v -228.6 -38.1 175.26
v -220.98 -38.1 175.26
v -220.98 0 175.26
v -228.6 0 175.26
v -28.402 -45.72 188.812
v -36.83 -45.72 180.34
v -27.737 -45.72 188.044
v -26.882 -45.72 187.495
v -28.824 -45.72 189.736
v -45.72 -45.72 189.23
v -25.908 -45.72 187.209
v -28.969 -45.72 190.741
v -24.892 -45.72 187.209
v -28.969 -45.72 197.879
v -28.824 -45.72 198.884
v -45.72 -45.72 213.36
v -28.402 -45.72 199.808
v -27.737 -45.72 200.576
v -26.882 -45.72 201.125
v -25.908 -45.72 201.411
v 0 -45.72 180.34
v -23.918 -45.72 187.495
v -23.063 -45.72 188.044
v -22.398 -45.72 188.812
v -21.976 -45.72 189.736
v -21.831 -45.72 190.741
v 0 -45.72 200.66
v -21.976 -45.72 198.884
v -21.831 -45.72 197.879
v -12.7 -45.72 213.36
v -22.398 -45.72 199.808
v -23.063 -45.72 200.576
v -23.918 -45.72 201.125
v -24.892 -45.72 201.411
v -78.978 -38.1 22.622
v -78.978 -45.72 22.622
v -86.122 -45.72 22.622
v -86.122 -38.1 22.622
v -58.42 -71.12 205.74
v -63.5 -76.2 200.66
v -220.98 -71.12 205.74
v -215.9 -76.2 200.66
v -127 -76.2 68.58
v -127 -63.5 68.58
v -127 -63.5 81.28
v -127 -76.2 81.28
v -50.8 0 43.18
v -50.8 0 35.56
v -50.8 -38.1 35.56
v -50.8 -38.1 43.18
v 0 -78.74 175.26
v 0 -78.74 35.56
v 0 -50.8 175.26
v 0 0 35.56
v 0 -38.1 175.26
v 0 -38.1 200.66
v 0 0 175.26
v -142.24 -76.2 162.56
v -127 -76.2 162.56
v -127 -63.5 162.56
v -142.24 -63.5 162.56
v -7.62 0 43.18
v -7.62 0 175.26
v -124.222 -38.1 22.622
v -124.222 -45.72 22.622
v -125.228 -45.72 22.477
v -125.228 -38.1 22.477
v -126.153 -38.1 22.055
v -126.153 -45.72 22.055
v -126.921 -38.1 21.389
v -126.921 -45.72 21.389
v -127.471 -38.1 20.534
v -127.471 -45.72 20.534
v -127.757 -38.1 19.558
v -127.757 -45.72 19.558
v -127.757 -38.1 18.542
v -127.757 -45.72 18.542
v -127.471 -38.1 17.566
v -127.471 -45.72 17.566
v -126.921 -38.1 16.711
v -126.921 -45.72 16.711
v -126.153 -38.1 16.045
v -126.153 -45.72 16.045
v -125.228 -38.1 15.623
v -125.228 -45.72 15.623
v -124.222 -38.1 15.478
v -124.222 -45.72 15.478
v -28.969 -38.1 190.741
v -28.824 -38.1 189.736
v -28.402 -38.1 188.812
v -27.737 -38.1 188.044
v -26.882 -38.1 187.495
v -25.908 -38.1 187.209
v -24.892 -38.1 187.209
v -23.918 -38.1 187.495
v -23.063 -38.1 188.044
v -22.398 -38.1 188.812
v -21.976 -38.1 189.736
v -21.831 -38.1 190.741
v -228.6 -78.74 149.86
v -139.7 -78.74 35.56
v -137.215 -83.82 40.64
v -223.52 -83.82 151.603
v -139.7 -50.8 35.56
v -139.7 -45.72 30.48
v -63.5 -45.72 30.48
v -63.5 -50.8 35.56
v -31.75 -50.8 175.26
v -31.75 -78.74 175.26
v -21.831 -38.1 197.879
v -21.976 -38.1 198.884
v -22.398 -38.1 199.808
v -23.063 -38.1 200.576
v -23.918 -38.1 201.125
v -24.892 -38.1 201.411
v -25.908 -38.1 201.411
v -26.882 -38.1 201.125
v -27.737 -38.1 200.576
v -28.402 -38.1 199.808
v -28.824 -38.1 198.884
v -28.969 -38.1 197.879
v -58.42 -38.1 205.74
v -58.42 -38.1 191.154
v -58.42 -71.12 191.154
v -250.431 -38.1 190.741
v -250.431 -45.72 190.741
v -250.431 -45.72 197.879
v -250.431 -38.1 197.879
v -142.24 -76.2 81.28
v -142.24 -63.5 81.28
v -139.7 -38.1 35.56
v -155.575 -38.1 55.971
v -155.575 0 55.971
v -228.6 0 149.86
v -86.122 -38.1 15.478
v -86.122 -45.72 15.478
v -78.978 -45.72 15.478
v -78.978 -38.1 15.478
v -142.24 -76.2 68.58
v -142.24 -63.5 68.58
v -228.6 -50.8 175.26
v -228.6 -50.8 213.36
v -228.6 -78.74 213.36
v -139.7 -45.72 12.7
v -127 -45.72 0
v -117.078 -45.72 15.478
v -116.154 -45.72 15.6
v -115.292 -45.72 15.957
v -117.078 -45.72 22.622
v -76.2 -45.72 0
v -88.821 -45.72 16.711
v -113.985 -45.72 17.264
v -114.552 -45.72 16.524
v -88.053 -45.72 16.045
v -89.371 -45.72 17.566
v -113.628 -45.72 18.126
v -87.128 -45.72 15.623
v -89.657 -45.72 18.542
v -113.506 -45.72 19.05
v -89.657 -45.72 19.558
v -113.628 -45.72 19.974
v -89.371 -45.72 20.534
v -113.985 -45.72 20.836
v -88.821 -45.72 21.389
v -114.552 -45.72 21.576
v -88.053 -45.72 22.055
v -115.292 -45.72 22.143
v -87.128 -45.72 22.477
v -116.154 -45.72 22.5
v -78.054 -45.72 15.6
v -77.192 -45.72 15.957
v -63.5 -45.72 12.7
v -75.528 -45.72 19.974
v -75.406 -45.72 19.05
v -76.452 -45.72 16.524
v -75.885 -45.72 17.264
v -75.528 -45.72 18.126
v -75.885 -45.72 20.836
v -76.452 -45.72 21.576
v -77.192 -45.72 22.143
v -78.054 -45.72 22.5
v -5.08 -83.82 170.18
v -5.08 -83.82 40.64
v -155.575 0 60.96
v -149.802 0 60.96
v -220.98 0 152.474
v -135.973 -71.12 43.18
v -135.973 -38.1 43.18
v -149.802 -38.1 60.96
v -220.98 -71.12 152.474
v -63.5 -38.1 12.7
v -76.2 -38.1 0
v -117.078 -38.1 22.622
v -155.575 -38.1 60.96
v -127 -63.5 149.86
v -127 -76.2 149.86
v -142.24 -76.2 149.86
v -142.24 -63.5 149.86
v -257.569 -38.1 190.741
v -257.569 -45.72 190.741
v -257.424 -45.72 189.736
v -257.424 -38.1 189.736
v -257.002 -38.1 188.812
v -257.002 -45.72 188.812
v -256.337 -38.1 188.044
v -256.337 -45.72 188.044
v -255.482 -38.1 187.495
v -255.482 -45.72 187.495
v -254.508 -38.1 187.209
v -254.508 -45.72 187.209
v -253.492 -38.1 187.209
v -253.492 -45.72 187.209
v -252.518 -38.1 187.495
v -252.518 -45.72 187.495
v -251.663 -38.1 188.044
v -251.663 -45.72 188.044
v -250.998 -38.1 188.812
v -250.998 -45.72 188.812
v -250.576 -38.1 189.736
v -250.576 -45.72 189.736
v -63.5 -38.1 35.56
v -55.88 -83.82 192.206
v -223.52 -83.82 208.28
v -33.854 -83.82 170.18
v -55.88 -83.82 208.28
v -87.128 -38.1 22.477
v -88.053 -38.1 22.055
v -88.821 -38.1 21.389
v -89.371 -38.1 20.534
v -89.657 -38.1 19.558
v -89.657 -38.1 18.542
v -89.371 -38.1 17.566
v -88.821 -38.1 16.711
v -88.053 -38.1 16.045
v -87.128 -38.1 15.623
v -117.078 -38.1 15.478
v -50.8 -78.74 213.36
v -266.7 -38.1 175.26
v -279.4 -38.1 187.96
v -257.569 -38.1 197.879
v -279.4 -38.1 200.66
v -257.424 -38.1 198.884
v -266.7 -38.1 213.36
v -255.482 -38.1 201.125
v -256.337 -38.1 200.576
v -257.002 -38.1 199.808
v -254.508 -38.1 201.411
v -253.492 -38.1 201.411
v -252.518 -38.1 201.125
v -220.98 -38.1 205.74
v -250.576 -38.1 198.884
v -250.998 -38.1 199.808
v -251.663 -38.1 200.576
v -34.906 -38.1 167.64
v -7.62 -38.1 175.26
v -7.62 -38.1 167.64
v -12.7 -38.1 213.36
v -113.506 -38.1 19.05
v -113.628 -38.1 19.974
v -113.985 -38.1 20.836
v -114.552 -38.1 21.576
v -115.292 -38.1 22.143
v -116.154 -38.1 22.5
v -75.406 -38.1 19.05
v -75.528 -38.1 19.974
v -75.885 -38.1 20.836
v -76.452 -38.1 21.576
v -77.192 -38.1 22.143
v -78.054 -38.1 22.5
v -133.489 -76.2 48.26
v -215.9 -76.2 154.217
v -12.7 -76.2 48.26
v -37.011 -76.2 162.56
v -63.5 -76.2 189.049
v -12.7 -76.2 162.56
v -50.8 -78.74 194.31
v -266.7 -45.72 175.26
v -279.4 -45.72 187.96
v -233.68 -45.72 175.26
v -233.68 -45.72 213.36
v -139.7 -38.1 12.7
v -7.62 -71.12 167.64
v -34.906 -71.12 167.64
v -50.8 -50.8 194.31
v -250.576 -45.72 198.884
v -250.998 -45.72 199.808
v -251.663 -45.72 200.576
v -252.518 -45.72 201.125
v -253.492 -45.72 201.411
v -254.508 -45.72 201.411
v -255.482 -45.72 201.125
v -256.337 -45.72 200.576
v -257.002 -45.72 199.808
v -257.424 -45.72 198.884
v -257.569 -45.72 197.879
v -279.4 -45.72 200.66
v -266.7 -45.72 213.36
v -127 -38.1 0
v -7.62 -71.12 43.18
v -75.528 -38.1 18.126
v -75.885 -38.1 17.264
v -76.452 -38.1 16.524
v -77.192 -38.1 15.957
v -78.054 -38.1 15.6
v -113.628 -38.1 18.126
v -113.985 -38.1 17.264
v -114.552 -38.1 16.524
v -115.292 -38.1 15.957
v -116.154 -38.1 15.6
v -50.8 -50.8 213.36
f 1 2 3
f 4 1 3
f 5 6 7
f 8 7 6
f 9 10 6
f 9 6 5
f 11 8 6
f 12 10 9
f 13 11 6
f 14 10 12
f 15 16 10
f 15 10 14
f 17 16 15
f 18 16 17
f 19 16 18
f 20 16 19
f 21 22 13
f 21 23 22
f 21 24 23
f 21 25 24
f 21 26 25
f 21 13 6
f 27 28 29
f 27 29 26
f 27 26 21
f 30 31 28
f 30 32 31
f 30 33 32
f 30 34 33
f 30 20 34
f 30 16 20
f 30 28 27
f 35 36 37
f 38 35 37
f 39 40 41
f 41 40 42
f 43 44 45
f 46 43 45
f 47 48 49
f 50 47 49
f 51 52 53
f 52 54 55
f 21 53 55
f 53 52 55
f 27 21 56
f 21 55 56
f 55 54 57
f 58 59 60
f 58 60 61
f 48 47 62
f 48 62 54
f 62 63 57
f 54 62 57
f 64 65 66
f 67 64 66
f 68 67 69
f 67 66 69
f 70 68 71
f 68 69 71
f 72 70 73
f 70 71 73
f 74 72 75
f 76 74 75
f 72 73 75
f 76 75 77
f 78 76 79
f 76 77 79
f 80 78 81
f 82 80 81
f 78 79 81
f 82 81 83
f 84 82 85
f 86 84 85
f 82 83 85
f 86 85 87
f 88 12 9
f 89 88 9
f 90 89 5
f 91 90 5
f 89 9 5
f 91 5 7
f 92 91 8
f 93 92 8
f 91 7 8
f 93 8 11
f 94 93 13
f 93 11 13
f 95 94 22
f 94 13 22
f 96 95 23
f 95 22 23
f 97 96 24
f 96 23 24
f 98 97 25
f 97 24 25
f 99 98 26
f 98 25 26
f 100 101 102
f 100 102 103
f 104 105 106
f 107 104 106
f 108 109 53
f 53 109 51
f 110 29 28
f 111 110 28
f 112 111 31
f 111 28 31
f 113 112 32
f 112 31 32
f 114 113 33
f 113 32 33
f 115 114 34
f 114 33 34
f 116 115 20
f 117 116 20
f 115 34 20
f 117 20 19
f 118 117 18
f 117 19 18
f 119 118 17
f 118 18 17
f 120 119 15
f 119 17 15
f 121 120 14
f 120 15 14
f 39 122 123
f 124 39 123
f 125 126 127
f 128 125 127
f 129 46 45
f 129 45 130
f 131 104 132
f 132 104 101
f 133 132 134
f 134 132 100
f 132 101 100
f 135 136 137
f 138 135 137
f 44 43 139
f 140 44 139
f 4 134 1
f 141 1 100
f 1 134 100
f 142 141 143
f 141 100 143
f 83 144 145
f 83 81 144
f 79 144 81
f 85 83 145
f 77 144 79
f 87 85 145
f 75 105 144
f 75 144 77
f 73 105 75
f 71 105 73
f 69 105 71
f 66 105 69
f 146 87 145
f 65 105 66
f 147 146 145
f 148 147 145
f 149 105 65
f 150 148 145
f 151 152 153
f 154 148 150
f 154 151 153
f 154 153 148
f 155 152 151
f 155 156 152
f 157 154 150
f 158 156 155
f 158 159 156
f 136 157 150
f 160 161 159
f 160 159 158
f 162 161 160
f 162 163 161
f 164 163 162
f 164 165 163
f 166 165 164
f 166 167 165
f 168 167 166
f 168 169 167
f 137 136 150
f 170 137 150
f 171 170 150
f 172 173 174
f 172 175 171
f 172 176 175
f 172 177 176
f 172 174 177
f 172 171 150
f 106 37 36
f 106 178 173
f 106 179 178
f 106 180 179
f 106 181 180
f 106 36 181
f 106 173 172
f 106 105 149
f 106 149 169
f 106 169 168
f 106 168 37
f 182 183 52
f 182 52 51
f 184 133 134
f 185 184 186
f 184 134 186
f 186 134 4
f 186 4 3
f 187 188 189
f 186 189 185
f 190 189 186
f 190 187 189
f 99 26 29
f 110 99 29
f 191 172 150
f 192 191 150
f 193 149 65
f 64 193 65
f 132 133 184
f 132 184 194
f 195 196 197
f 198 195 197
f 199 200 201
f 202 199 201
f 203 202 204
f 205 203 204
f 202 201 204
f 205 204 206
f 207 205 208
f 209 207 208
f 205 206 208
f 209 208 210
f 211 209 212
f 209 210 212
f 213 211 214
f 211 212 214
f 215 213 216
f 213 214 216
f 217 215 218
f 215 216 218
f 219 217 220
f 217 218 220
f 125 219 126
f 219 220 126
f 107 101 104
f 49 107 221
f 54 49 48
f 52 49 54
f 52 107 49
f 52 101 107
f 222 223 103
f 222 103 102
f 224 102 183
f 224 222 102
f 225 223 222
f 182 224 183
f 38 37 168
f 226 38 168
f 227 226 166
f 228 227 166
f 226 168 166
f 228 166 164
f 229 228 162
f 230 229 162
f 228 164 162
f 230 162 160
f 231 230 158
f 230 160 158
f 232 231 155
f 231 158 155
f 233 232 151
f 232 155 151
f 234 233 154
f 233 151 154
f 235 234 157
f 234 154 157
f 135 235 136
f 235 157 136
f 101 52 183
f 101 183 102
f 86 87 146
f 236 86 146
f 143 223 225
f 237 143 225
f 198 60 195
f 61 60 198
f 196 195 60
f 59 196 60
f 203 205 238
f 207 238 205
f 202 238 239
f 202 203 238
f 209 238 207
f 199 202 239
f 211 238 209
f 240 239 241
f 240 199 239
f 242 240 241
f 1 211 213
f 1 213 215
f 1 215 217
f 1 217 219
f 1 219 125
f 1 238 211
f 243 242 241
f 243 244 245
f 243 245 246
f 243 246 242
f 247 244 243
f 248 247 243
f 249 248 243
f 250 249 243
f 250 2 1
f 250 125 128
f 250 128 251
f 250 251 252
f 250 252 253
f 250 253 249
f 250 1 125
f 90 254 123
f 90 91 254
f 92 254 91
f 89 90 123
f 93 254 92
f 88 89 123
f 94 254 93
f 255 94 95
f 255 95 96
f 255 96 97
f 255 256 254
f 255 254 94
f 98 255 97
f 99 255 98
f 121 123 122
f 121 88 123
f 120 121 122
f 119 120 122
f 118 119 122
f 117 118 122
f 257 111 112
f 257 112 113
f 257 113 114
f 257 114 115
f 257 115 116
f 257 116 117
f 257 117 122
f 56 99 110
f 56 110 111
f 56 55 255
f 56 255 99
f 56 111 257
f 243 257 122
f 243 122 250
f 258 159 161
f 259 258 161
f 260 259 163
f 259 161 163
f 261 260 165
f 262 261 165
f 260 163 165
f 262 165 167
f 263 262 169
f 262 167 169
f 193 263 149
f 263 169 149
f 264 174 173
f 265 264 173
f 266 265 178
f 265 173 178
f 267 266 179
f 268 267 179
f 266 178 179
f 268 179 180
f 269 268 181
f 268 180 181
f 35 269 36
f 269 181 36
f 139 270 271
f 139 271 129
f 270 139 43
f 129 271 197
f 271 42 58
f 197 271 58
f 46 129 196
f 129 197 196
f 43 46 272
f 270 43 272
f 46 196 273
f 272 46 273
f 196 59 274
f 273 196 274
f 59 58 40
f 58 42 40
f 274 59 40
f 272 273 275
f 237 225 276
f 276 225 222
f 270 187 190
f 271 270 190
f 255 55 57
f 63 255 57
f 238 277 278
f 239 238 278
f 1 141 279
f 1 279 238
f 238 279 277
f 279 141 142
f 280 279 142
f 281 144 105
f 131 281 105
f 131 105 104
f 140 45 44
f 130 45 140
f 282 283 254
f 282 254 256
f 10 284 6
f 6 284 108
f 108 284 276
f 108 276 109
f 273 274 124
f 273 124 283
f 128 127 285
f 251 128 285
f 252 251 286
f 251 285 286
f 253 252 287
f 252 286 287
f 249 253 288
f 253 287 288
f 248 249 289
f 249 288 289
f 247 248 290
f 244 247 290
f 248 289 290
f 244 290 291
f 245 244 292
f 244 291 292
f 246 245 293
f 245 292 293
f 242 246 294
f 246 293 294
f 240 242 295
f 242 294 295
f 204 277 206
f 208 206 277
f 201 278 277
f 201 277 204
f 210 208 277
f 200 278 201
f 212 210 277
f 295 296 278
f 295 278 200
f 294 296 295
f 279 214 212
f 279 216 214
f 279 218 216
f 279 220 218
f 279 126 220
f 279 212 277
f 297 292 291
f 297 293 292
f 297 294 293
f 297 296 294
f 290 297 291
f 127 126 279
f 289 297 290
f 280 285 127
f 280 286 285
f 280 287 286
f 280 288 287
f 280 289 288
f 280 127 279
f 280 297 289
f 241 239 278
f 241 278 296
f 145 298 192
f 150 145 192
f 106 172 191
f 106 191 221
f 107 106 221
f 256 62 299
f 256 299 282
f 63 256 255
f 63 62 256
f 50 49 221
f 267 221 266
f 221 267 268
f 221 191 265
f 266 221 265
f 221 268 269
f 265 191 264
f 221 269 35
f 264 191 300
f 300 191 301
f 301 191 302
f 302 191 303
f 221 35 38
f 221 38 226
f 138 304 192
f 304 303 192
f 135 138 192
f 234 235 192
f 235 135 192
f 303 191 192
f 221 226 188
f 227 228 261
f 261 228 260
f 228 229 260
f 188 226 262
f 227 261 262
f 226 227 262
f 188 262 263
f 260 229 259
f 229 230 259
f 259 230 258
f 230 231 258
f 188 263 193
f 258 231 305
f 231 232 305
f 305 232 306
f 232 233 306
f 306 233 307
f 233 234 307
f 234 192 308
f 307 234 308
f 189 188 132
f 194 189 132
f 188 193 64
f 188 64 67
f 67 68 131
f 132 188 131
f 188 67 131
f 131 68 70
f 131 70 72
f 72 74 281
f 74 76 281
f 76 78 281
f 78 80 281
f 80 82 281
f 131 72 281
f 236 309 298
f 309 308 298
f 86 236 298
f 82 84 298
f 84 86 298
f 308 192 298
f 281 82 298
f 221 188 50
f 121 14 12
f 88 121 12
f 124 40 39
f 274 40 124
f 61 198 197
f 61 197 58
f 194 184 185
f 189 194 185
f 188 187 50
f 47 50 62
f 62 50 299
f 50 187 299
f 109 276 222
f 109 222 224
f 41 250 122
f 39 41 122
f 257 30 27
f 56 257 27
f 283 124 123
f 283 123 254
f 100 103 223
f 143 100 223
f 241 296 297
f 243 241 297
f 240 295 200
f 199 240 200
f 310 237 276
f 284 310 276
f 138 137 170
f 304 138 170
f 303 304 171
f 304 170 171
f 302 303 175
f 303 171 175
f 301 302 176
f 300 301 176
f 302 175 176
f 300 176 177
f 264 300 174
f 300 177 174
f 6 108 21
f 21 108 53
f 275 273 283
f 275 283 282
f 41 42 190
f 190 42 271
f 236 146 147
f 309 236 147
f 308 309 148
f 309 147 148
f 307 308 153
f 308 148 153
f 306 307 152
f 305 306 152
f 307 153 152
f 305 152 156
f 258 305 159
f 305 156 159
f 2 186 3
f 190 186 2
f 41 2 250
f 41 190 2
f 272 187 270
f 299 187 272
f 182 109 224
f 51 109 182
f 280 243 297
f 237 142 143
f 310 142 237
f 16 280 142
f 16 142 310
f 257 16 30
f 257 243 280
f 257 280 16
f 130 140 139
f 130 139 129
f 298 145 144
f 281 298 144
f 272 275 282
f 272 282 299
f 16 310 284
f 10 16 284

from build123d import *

# Parameters (mm, degrees)
F0_W      = 279.4
F0_H      = 213.36
F1_DEPTH  = 83.82
F2_W      = 76.2
F2_H      = 35.56
F2_W_2    = 50.8
F2_H_2    = 38.1
F3_DEPTH  = 38.1
F2_W_3    = 63.5
F4_DEPTH  = 83.82
F5_T      = -7.62
F6_W      = 38.1
F6_H      = 38.1
F6_H_2    = 35.56
F7_DEPTH  = 341.884
F9_DEPTH  = 7.62
F10_SIZE  = 5.08
F11_W     = 84.455
F11_H     = 38.1
F12_DEPTH = 25.4
F13_W     = 15.24
F13_H     = 12.7
F14_DEPTH = 12.7


# Not quite as in the source:
# - a feature names something its author has since deleted; it is built from what else it names


with BuildPart() as f1:
    # F0 (on Front) → F1 (new body)
    with BuildSketch(Plane.XZ):
        with Locations((-139.7, 106.68)):
            Rectangle(F0_W, F0_H)
    extrude(amount=F1_DEPTH)

    # F2 (on face) → F3 (cut)
    with BuildSketch(Plane.XZ.offset(83.82)):
        Polygon((0, 213.36), (-50.8, 213.36), (-50.8, 194.31), (-31.75, 175.26), (0, 175.26), align=None)
        with Locations((-101.6, 17.78)):
            Rectangle(F2_W, F2_H)
        with Locations((-254, 194.31)):
            Rectangle(F2_W_2, F2_H_2)
    extrude(amount=-F3_DEPTH, mode=Mode.SUBTRACT)

    # F2 (on face) → F4 (cut)
    with BuildSketch(Plane.XZ.offset(83.82)):
        Polygon((-228.6, 149.86), (-228.6, 175.26), (-279.4, 175.26), (-279.4, 0), (-139.7, 0), (-139.7, 35.56), align=None)
        with Locations((-31.75, 17.78)):
            Rectangle(F2_W_3, F2_H)
    extrude(amount=-F4_DEPTH, mode=Mode.SUBTRACT)

    # F5
    f5_openings = [f1.faces().sort_by_distance(p)[0] for p in [
        (-109.470638, 0, 127.051961),
    ]]
    offset(amount=F5_T, openings=f5_openings, kind=Kind.INTERSECTION)

    # F6 (on face) → F7 (cut)
    with BuildSketch(Plane.YZ):
        with Locations((-19.05, 194.31)):
            Rectangle(F6_W, F6_H)
        with Locations((-19.05, 17.78)):
            Rectangle(F6_W, F6_H_2)
    extrude(amount=-F7_DEPTH, mode=Mode.SUBTRACT)

    # F8 (on face) → F9 (cut)
    with BuildSketch(Plane.XZ.offset(45.72)):
        with BuildLine():
            ThreePointArc((-22.3094151415, 192.52565), (-21.9529005037, 193.3863524737), (-21.8313, 194.31))
            ThreePointArc((-21.8313, 194.31), (-21.9529005037, 195.2336475263), (-22.3094151415, 196.09435))
            ThreePointArc((-22.3094151415, 196.09435), (-23.61565, 194.7881151415), (-25.4, 194.31))
            ThreePointArc((-25.4, 194.31), (-23.61565, 193.8318848585), (-22.3094151415, 192.52565))
        make_face()
        with BuildLine():
            ThreePointArc((-25.4, 194.31), (-27.18435, 194.7881151415), (-28.4905848585, 196.09435))
            ThreePointArc((-28.4905848585, 196.09435), (-28.8470994963, 195.2336475263), (-28.9687, 194.31))
            ThreePointArc((-28.9687, 194.31), (-28.8470994963, 193.3863524737), (-28.4905848585, 192.52565))
            ThreePointArc((-28.4905848585, 192.52565), (-27.18435, 193.8318848585), (-25.4, 194.31))
        make_face()
        Polygon((0, 200.66), (0, 213.36), (-12.7, 213.36), align=None)
        with BuildLine():
            ThreePointArc((-250.9094151415, 192.52565), (-250.5529005037, 193.3863524737), (-250.4313, 194.31))
            ThreePointArc((-250.4313, 194.31), (-250.5529005037, 195.2336475263), (-250.9094151415, 196.09435))
            ThreePointArc((-250.9094151415, 196.09435), (-252.21565, 194.7881151415), (-254, 194.31))
            ThreePointArc((-254, 194.31), (-252.21565, 193.8318848585), (-250.9094151415, 192.52565))
        make_face()
        with BuildLine():
            ThreePointArc((-254, 194.31), (-255.78435, 194.7881151415), (-257.0905848585, 196.09435))
            ThreePointArc((-257.0905848585, 196.09435), (-257.4470994963, 195.2336475263), (-257.5687, 194.31))
            ThreePointArc((-257.5687, 194.31), (-257.4470994963, 193.3863524737), (-257.0905848585, 192.52565))
            ThreePointArc((-257.0905848585, 192.52565), (-255.78435, 193.8318848585), (-254, 194.31))
        make_face()
        Polygon((-279.4, 200.66), (-266.7, 213.36), (-279.4, 213.36), align=None)
        Polygon((-279.4, 175.26), (-266.7, 175.26), (-279.4, 187.96), align=None)
        Polygon((-127, 0), (-139.7, 12.7), (-139.7, 0), align=None)
        Polygon((-63.5, 12.7), (-76.2, 0), (-63.5, 0), align=None)
        with BuildLine():
            ThreePointArc((-82.55, 19.05), (-82.0714594891, 20.8359375), (-80.7640625, 22.1433344891))
            ThreePointArc((-80.7640625, 22.1433344891), (-81.6255307233, 22.5001663108), (-82.55, 22.621875))
            ThreePointArc((-82.55, 22.621875), (-83.4744692767, 22.5001663108), (-84.3359375, 22.1433344891))
            ThreePointArc((-84.3359375, 22.1433344891), (-83.0285405109, 20.8359375), (-82.55, 19.05))
        make_face()
        with BuildLine():
            ThreePointArc((-82.55, 15.478125), (-81.6255307233, 15.5998336892), (-80.7640625, 15.9566655109))
            ThreePointArc((-80.7640625, 15.9566655109), (-82.0714594891, 17.2640625), (-82.55, 19.05))
            ThreePointArc((-82.55, 19.05), (-83.0285405109, 17.2640625), (-84.3359375, 15.9566655109))
            ThreePointArc((-84.3359375, 15.9566655109), (-83.4744692767, 15.5998336892), (-82.55, 15.478125))
        make_face()
        with BuildLine():
            ThreePointArc((-120.65, 19.05), (-120.1714594891, 20.8359375), (-118.8640625, 22.1433344891))
            ThreePointArc((-118.8640625, 22.1433344891), (-119.7255307233, 22.5001663108), (-120.65, 22.621875))
            ThreePointArc((-120.65, 22.621875), (-121.5744692767, 22.5001663108), (-122.4359375, 22.1433344891))
            ThreePointArc((-122.4359375, 22.1433344891), (-121.1285405109, 20.8359375), (-120.65, 19.05))
        make_face()
        with BuildLine():
            ThreePointArc((-120.65, 15.478125), (-119.7255307233, 15.5998336892), (-118.8640625, 15.9566655109))
            ThreePointArc((-118.8640625, 15.9566655109), (-120.1714594891, 17.2640625), (-120.65, 19.05))
            ThreePointArc((-120.65, 19.05), (-121.1285405109, 17.2640625), (-122.4359375, 15.9566655109))
            ThreePointArc((-122.4359375, 15.9566655109), (-121.5744692767, 15.5998336892), (-120.65, 15.478125))
        make_face()
        with BuildLine():
            ThreePointArc((-28.4905848585, 196.09435), (-25.4, 197.8787), (-22.3094151415, 196.09435))
            ThreePointArc((-22.3094151415, 196.09435), (-21.9529005037, 196.9550524737), (-21.8313, 197.8787))
            ThreePointArc((-21.8313, 197.8787), (-25.4, 201.4474), (-28.9687, 197.8787))
            ThreePointArc((-28.9687, 197.8787), (-28.8470994963, 196.9550524737), (-28.4905848585, 196.09435))
        make_face()
        with BuildLine():
            ThreePointArc((-25.4, 194.31), (-23.61565, 194.7881151415), (-22.3094151415, 196.09435))
            ThreePointArc((-22.3094151415, 196.09435), (-25.4, 197.8787), (-28.4905848585, 196.09435))
            ThreePointArc((-28.4905848585, 196.09435), (-27.18435, 194.7881151415), (-25.4, 194.31))
        make_face()
        with BuildLine():
            ThreePointArc((-28.4905848585, 192.52565), (-25.4, 190.7413), (-22.3094151415, 192.52565))
            ThreePointArc((-22.3094151415, 192.52565), (-23.61565, 193.8318848585), (-25.4, 194.31))
            ThreePointArc((-25.4, 194.31), (-27.18435, 193.8318848585), (-28.4905848585, 192.52565))
        make_face()
        with BuildLine():
            ThreePointArc((-21.8313, 190.7413), (-21.9529005037, 191.6649475263), (-22.3094151415, 192.52565))
            ThreePointArc((-22.3094151415, 192.52565), (-25.4, 190.7413), (-28.4905848585, 192.52565))
            ThreePointArc((-28.4905848585, 192.52565), (-28.8470994963, 191.6649475263), (-28.9687, 190.7413))
            ThreePointArc((-28.9687, 190.7413), (-25.4, 187.1726), (-21.8313, 190.7413))
        make_face()
        with BuildLine():
            ThreePointArc((-28.9687, 194.31), (-28.8470994963, 195.2336475263), (-28.4905848585, 196.09435))
            ThreePointArc((-28.4905848585, 196.09435), (-28.8470994963, 196.9550524737), (-28.9687, 197.8787))
            Line((-28.9687, 197.8787), (-28.9687, 194.31))
        make_face()
        with BuildLine():
            ThreePointArc((-22.3094151415, 196.09435), (-21.9529005037, 195.2336475263), (-21.8313, 194.31))
            Line((-21.8313, 194.31), (-21.8313, 197.8787))
            ThreePointArc((-21.8313, 197.8787), (-21.9529005037, 196.9550524737), (-22.3094151415, 196.09435))
        make_face()
        with BuildLine():
            Line((-21.8313, 190.7413), (-21.8313, 194.31))
            ThreePointArc((-21.8313, 194.31), (-21.9529005037, 193.3863524737), (-22.3094151415, 192.52565))
            ThreePointArc((-22.3094151415, 192.52565), (-21.9529005037, 191.6649475263), (-21.8313, 190.7413))
        make_face()
        with BuildLine():
            ThreePointArc((-28.9687, 190.7413), (-28.8470994963, 191.6649475263), (-28.4905848585, 192.52565))
            ThreePointArc((-28.4905848585, 192.52565), (-28.8470994963, 193.3863524737), (-28.9687, 194.31))
            Line((-28.9687, 194.31), (-28.9687, 190.7413))
        make_face()
        with BuildLine():
            ThreePointArc((-122.4359375, 15.9566655109), (-121.1285405109, 17.2640625), (-120.65, 19.05))
            ThreePointArc((-120.65, 19.05), (-121.1285405109, 20.8359375), (-122.4359375, 22.1433344891))
            ThreePointArc((-122.4359375, 22.1433344891), (-124.221875, 19.05), (-122.4359375, 15.9566655109))
        make_face()
        with BuildLine():
            ThreePointArc((-118.8640625, 15.9566655109), (-117.5566655109, 17.2640625), (-117.078125, 19.05))
            ThreePointArc((-117.078125, 19.05), (-117.5566655109, 20.8359375), (-118.8640625, 22.1433344891))
            ThreePointArc((-118.8640625, 22.1433344891), (-120.1714594891, 20.8359375), (-120.65, 19.05))
            ThreePointArc((-120.65, 19.05), (-120.1714594891, 17.2640625), (-118.8640625, 15.9566655109))
        make_face()
        with BuildLine():
            ThreePointArc((-118.8640625, 22.1433344891), (-117.5566655109, 20.8359375), (-117.078125, 19.05))
            ThreePointArc((-117.078125, 19.05), (-117.5566655109, 17.2640625), (-118.8640625, 15.9566655109))
            ThreePointArc((-118.8640625, 15.9566655109), (-118.0025942767, 15.5998336892), (-117.078125, 15.478125))
            ThreePointArc((-117.078125, 15.478125), (-114.5524279659, 16.5243029659), (-113.50625, 19.05))
            ThreePointArc((-113.50625, 19.05), (-114.5524279659, 21.5756970341), (-117.078125, 22.621875))
            ThreePointArc((-117.078125, 22.621875), (-118.0025942767, 22.5001663108), (-118.8640625, 22.1433344891))
        make_face()
        with BuildLine():
            ThreePointArc((-122.4359375, 15.9566655109), (-124.221875, 19.05), (-122.4359375, 22.1433344891))
            ThreePointArc((-122.4359375, 22.1433344891), (-123.2974057233, 22.5001663108), (-124.221875, 22.621875))
            ThreePointArc((-124.221875, 22.621875), (-127.79375, 19.05), (-124.221875, 15.478125))
            ThreePointArc((-124.221875, 15.478125), (-123.2974057233, 15.5998336892), (-122.4359375, 15.9566655109))
        make_face()
        with BuildLine():
            ThreePointArc((-120.65, 22.621875), (-119.7255307233, 22.5001663108), (-118.8640625, 22.1433344891))
            ThreePointArc((-118.8640625, 22.1433344891), (-118.0025942767, 22.5001663108), (-117.078125, 22.621875))
            Line((-117.078125, 22.621875), (-120.65, 22.621875))
        make_face()
        with BuildLine():
            ThreePointArc((-122.4359375, 22.1433344891), (-121.5744692767, 22.5001663108), (-120.65, 22.621875))
            Line((-120.65, 22.621875), (-124.221875, 22.621875))
            ThreePointArc((-124.221875, 22.621875), (-123.2974057233, 22.5001663108), (-122.4359375, 22.1433344891))
        make_face()
        with BuildLine():
            ThreePointArc((-117.078125, 15.478125), (-118.0025942767, 15.5998336892), (-118.8640625, 15.9566655109))
            ThreePointArc((-118.8640625, 15.9566655109), (-119.7255307233, 15.5998336892), (-120.65, 15.478125))
            Line((-120.65, 15.478125), (-117.078125, 15.478125))
        make_face()
        with BuildLine():
            Line((-124.221875, 15.478125), (-120.65, 15.478125))
            ThreePointArc((-120.65, 15.478125), (-121.5744692767, 15.5998336892), (-122.4359375, 15.9566655109))
            ThreePointArc((-122.4359375, 15.9566655109), (-123.2974057233, 15.5998336892), (-124.221875, 15.478125))
        make_face()
        with BuildLine():
            ThreePointArc((-82.55, 22.621875), (-81.6255307233, 22.5001663108), (-80.7640625, 22.1433344891))
            ThreePointArc((-80.7640625, 22.1433344891), (-79.9025942767, 22.5001663108), (-78.978125, 22.621875))
            Line((-78.978125, 22.621875), (-82.55, 22.621875))
        make_face()
        with BuildLine():
            ThreePointArc((-84.3359375, 22.1433344891), (-83.4744692767, 22.5001663108), (-82.55, 22.621875))
            Line((-82.55, 22.621875), (-86.121875, 22.621875))
            ThreePointArc((-86.121875, 22.621875), (-85.1974057233, 22.5001663108), (-84.3359375, 22.1433344891))
        make_face()
        with BuildLine():
            ThreePointArc((-84.3359375, 15.9566655109), (-86.121875, 19.05), (-84.3359375, 22.1433344891))
            ThreePointArc((-84.3359375, 22.1433344891), (-85.1974057233, 22.5001663108), (-86.121875, 22.621875))
            ThreePointArc((-86.121875, 22.621875), (-89.69375, 19.05), (-86.121875, 15.478125))
            ThreePointArc((-86.121875, 15.478125), (-85.1974057233, 15.5998336892), (-84.3359375, 15.9566655109))
        make_face()
        with BuildLine():
            ThreePointArc((-84.3359375, 15.9566655109), (-83.0285405109, 17.2640625), (-82.55, 19.05))
            ThreePointArc((-82.55, 19.05), (-83.0285405109, 20.8359375), (-84.3359375, 22.1433344891))
            ThreePointArc((-84.3359375, 22.1433344891), (-86.121875, 19.05), (-84.3359375, 15.9566655109))
        make_face()
        with BuildLine():
            ThreePointArc((-80.7640625, 15.9566655109), (-79.4566655109, 17.2640625), (-78.978125, 19.05))
            ThreePointArc((-78.978125, 19.05), (-79.4566655109, 20.8359375), (-80.7640625, 22.1433344891))
            ThreePointArc((-80.7640625, 22.1433344891), (-82.0714594891, 20.8359375), (-82.55, 19.05))
            ThreePointArc((-82.55, 19.05), (-82.0714594891, 17.2640625), (-80.7640625, 15.9566655109))
        make_face()
        with BuildLine():
            ThreePointArc((-80.7640625, 22.1433344891), (-79.4566655109, 20.8359375), (-78.978125, 19.05))
            ThreePointArc((-78.978125, 19.05), (-79.4566655109, 17.2640625), (-80.7640625, 15.9566655109))
            ThreePointArc((-80.7640625, 15.9566655109), (-79.9025942767, 15.5998336892), (-78.978125, 15.478125))
            ThreePointArc((-78.978125, 15.478125), (-76.4524279659, 16.5243029659), (-75.40625, 19.05))
            ThreePointArc((-75.40625, 19.05), (-76.4524279659, 21.5756970341), (-78.978125, 22.621875))
            ThreePointArc((-78.978125, 22.621875), (-79.9025942767, 22.5001663108), (-80.7640625, 22.1433344891))
        make_face()
        with BuildLine():
            ThreePointArc((-78.978125, 15.478125), (-79.9025942767, 15.5998336892), (-80.7640625, 15.9566655109))
            ThreePointArc((-80.7640625, 15.9566655109), (-81.6255307233, 15.5998336892), (-82.55, 15.478125))
            Line((-82.55, 15.478125), (-78.978125, 15.478125))
        make_face()
        with BuildLine():
            Line((-86.121875, 15.478125), (-82.55, 15.478125))
            ThreePointArc((-82.55, 15.478125), (-83.4744692767, 15.5998336892), (-84.3359375, 15.9566655109))
            ThreePointArc((-84.3359375, 15.9566655109), (-85.1974057233, 15.5998336892), (-86.121875, 15.478125))
        make_face()
        with BuildLine():
            ThreePointArc((-254, 194.31), (-252.21565, 194.7881151415), (-250.9094151415, 196.09435))
            ThreePointArc((-250.9094151415, 196.09435), (-254, 197.8787), (-257.0905848585, 196.09435))
            ThreePointArc((-257.0905848585, 196.09435), (-255.78435, 194.7881151415), (-254, 194.31))
        make_face()
        with BuildLine():
            ThreePointArc((-257.0905848585, 196.09435), (-254, 197.8787), (-250.9094151415, 196.09435))
            ThreePointArc((-250.9094151415, 196.09435), (-250.5529005037, 196.9550524737), (-250.4313, 197.8787))
            ThreePointArc((-250.4313, 197.8787), (-254, 201.4474), (-257.5687, 197.8787))
            ThreePointArc((-257.5687, 197.8787), (-257.4470994963, 196.9550524737), (-257.0905848585, 196.09435))
        make_face()
        with BuildLine():
            ThreePointArc((-257.0905848585, 192.52565), (-254, 190.7413), (-250.9094151415, 192.52565))
            ThreePointArc((-250.9094151415, 192.52565), (-252.21565, 193.8318848585), (-254, 194.31))
            ThreePointArc((-254, 194.31), (-255.78435, 193.8318848585), (-257.0905848585, 192.52565))
        make_face()
        with BuildLine():
            ThreePointArc((-250.4313, 190.7413), (-250.5529005037, 191.6649475263), (-250.9094151415, 192.52565))
            ThreePointArc((-250.9094151415, 192.52565), (-254, 190.7413), (-257.0905848585, 192.52565))
            ThreePointArc((-257.0905848585, 192.52565), (-257.4470994963, 191.6649475263), (-257.5687, 190.7413))
            ThreePointArc((-257.5687, 190.7413), (-254, 187.1726), (-250.4313, 190.7413))
        make_face()
        with BuildLine():
            Line((-250.4313, 190.7413), (-250.4313, 194.31))
            ThreePointArc((-250.4313, 194.31), (-250.5529005037, 193.3863524737), (-250.9094151415, 192.52565))
            ThreePointArc((-250.9094151415, 192.52565), (-250.5529005037, 191.6649475263), (-250.4313, 190.7413))
        make_face()
        with BuildLine():
            ThreePointArc((-250.9094151415, 196.09435), (-250.5529005037, 195.2336475263), (-250.4313, 194.31))
            Line((-250.4313, 194.31), (-250.4313, 197.8787))
            ThreePointArc((-250.4313, 197.8787), (-250.5529005037, 196.9550524737), (-250.9094151415, 196.09435))
        make_face()
        with BuildLine():
            ThreePointArc((-257.5687, 194.31), (-257.4470994963, 195.2336475263), (-257.0905848585, 196.09435))
            ThreePointArc((-257.0905848585, 196.09435), (-257.4470994963, 196.9550524737), (-257.5687, 197.8787))
            Line((-257.5687, 197.8787), (-257.5687, 194.31))
        make_face()
        with BuildLine():
            ThreePointArc((-257.5687, 190.7413), (-257.4470994963, 191.6649475263), (-257.0905848585, 192.52565))
            ThreePointArc((-257.0905848585, 192.52565), (-257.4470994963, 193.3863524737), (-257.5687, 194.31))
            Line((-257.5687, 194.31), (-257.5687, 190.7413))
        make_face()
    extrude(amount=-F9_DEPTH, mode=Mode.SUBTRACT)

    # F10
    f10_edges = [f1.edges().sort_by_distance(p)[0] for p in [
        (-50.8, -45.72, 203.835),
        (-15.875, -45.72, 175.26),
        (-228.6, -45.72, 194.31),
        (-101.6, -45.72, 35.56),
        (-220.98, -76.2, 179.107241),
        (-139.7, -76.2, 205.74),
        (-58.42, -76.2, 198.446846),
        (-46.663154, -76.2, 179.396846),
        (-21.263154, -76.2, 167.64),
        (-7.62, -76.2, 105.41),
        (-71.796591, -76.2, 43.18),
        (-178.476591, -76.2, 97.827241),
        (-139.7, -83.82, 213.36),
        (-228.6, -83.82, 181.61),
        (-184.15, -83.82, 92.71),
        (-69.85, -83.82, 35.56),
        (0, -83.82, 105.41),
        (-15.875, -83.82, 175.26),
        (-41.275, -83.82, 184.785),
        (-50.8, -83.82, 203.835),
    ]]
    chamfer(f10_edges, length=F10_SIZE)

    # F11 (on face) → F12 (cut)
    with BuildSketch(Plane(origin=(0, 0, 35.56), x_dir=(1, 0, 0), z_dir=(0, 0, -1))):
        Polygon((-71.12, 38.1), (-71.12, 0), (-50.8, 0), (-50.8, 38.1), (-63.5, 38.1), align=None)
        with Locations((-113.3475, 19.05)):
            Rectangle(F11_W, F11_H)
    extrude(amount=-F12_DEPTH, mode=Mode.SUBTRACT)

    # F13 (on face) → F14 (join)
    with BuildSketch(Plane(origin=(0, -76.2, 0), x_dir=(-1, 0, 0), z_dir=(0, 1, 0))):
        with Locations((134.62, 156.21)):
            Rectangle(F13_W, F13_H)
        with Locations((134.62, 74.93)):
            Rectangle(F13_W, F13_H)
    extrude(amount=F14_DEPTH)


solid = f1.part
